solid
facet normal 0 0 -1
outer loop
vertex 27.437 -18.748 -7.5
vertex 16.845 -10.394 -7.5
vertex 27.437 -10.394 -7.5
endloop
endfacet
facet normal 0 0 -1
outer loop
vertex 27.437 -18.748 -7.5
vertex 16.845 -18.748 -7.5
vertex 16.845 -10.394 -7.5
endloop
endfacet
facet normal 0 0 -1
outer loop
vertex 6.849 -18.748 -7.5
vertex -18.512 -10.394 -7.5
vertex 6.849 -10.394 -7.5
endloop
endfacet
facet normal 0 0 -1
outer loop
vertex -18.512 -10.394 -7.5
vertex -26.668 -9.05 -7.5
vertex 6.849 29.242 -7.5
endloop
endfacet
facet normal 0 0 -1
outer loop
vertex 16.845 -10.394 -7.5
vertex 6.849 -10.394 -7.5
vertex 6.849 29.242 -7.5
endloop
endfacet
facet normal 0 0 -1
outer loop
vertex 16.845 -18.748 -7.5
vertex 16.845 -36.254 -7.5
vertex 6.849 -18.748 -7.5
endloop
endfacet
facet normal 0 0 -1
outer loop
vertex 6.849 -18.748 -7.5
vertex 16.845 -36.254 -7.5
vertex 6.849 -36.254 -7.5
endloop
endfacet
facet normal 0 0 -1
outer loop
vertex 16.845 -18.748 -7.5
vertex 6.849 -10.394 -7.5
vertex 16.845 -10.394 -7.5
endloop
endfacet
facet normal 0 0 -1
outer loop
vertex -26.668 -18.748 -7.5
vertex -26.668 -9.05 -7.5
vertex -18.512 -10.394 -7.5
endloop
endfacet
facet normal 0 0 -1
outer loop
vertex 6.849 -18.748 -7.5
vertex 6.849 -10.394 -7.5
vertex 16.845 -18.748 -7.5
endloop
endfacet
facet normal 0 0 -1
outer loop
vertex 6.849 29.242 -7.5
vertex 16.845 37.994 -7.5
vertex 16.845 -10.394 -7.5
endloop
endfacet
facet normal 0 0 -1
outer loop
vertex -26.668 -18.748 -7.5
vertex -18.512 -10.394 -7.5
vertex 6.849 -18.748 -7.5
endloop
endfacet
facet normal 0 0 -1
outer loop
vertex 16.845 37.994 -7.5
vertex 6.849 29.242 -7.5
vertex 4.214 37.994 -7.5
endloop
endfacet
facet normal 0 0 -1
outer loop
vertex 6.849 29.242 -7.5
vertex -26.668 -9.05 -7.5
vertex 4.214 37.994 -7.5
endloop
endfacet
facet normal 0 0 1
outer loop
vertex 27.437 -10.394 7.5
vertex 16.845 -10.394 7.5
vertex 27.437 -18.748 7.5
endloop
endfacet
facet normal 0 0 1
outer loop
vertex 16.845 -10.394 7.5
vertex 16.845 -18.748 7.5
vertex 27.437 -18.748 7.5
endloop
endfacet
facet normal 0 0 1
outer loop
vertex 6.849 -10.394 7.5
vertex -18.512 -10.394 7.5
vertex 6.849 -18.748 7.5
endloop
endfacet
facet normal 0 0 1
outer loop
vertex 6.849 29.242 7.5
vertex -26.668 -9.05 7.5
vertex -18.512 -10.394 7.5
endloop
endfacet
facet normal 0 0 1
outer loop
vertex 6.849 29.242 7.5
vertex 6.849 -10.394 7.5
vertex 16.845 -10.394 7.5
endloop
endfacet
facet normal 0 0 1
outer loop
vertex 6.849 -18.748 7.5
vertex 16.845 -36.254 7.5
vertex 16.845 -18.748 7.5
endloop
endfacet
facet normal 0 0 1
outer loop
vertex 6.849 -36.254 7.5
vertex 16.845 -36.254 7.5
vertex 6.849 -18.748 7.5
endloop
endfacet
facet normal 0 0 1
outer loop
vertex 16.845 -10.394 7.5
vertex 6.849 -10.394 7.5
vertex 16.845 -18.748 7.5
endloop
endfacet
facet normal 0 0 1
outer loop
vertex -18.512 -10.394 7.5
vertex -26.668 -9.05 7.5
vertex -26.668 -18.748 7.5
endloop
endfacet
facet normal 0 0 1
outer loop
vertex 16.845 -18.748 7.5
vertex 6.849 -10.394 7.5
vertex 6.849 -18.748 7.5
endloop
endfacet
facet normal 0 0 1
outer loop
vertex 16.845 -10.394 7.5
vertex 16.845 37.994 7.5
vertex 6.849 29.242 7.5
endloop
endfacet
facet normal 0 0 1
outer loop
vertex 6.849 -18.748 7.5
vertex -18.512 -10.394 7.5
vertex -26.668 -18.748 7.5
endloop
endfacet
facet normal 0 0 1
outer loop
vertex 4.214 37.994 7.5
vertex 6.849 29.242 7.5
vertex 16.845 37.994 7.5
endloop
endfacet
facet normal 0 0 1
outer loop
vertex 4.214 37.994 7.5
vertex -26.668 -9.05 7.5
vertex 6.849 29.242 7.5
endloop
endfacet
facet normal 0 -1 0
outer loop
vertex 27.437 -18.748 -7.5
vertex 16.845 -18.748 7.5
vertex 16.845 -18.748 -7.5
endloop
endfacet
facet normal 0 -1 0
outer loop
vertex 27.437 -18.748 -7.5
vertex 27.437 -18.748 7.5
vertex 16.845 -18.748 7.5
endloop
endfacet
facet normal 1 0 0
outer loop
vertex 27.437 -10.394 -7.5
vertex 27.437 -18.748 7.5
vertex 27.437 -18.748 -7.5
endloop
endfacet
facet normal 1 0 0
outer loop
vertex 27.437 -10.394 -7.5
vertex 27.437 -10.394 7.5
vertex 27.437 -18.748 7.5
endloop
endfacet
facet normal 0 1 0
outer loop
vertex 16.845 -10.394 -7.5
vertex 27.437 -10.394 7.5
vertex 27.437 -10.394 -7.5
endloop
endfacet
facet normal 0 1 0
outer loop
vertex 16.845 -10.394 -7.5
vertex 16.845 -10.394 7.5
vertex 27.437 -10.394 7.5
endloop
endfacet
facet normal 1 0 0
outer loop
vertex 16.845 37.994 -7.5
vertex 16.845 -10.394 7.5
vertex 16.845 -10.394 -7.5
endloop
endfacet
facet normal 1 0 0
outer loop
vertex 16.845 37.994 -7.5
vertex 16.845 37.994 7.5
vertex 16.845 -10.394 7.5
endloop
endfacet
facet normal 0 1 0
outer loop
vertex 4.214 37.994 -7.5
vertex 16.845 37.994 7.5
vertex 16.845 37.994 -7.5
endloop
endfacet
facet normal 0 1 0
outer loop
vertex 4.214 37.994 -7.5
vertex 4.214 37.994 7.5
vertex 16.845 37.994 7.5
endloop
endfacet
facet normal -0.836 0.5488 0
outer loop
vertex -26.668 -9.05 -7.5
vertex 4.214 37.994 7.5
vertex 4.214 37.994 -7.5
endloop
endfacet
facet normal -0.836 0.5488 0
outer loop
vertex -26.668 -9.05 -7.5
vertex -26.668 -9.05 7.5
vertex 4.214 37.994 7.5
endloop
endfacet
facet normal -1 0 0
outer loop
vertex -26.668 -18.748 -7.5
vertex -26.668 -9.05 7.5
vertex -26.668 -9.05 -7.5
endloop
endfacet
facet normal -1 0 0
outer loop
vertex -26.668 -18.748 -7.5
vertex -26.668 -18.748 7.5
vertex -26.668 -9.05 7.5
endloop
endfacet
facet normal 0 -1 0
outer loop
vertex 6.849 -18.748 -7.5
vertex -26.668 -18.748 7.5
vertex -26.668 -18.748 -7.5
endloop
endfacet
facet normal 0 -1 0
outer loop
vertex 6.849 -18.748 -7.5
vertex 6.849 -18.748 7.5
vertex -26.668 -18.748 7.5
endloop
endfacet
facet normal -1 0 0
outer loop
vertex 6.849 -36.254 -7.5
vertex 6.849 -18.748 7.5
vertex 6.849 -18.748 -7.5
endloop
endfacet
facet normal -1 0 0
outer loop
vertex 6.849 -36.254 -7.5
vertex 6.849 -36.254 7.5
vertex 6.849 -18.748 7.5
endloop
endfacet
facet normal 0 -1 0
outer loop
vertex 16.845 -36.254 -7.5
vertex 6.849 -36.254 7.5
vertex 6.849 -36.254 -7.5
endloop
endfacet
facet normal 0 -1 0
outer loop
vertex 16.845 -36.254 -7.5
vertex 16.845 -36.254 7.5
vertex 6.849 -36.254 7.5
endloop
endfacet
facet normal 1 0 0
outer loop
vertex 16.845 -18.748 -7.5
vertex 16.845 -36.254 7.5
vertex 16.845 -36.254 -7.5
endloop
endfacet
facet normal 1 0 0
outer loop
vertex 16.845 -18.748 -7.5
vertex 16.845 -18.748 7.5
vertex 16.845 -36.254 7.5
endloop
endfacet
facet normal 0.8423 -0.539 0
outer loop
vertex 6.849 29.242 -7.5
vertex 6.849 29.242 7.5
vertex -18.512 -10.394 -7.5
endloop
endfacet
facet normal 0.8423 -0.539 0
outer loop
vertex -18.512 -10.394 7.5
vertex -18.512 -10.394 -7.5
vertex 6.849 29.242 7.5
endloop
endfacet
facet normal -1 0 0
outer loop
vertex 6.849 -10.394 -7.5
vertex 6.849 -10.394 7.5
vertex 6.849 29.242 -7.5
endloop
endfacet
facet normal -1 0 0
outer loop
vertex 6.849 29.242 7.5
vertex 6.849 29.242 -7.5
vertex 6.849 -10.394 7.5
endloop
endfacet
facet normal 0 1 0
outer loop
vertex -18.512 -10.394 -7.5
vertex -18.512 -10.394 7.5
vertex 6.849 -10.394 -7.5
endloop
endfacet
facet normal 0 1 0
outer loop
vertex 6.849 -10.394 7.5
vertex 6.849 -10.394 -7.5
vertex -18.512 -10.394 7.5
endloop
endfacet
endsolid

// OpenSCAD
letter = "4";
size = 100;

// translate ([0,0,0]) import ("heart.stl");

// Font : Niconne
// Font Palatino Linotype
linear_extrude(height = 15, center = true)
    text(letter, 
     size=size*22/30,
     font="Niconne",
     halign="center",
     valign="center");            
